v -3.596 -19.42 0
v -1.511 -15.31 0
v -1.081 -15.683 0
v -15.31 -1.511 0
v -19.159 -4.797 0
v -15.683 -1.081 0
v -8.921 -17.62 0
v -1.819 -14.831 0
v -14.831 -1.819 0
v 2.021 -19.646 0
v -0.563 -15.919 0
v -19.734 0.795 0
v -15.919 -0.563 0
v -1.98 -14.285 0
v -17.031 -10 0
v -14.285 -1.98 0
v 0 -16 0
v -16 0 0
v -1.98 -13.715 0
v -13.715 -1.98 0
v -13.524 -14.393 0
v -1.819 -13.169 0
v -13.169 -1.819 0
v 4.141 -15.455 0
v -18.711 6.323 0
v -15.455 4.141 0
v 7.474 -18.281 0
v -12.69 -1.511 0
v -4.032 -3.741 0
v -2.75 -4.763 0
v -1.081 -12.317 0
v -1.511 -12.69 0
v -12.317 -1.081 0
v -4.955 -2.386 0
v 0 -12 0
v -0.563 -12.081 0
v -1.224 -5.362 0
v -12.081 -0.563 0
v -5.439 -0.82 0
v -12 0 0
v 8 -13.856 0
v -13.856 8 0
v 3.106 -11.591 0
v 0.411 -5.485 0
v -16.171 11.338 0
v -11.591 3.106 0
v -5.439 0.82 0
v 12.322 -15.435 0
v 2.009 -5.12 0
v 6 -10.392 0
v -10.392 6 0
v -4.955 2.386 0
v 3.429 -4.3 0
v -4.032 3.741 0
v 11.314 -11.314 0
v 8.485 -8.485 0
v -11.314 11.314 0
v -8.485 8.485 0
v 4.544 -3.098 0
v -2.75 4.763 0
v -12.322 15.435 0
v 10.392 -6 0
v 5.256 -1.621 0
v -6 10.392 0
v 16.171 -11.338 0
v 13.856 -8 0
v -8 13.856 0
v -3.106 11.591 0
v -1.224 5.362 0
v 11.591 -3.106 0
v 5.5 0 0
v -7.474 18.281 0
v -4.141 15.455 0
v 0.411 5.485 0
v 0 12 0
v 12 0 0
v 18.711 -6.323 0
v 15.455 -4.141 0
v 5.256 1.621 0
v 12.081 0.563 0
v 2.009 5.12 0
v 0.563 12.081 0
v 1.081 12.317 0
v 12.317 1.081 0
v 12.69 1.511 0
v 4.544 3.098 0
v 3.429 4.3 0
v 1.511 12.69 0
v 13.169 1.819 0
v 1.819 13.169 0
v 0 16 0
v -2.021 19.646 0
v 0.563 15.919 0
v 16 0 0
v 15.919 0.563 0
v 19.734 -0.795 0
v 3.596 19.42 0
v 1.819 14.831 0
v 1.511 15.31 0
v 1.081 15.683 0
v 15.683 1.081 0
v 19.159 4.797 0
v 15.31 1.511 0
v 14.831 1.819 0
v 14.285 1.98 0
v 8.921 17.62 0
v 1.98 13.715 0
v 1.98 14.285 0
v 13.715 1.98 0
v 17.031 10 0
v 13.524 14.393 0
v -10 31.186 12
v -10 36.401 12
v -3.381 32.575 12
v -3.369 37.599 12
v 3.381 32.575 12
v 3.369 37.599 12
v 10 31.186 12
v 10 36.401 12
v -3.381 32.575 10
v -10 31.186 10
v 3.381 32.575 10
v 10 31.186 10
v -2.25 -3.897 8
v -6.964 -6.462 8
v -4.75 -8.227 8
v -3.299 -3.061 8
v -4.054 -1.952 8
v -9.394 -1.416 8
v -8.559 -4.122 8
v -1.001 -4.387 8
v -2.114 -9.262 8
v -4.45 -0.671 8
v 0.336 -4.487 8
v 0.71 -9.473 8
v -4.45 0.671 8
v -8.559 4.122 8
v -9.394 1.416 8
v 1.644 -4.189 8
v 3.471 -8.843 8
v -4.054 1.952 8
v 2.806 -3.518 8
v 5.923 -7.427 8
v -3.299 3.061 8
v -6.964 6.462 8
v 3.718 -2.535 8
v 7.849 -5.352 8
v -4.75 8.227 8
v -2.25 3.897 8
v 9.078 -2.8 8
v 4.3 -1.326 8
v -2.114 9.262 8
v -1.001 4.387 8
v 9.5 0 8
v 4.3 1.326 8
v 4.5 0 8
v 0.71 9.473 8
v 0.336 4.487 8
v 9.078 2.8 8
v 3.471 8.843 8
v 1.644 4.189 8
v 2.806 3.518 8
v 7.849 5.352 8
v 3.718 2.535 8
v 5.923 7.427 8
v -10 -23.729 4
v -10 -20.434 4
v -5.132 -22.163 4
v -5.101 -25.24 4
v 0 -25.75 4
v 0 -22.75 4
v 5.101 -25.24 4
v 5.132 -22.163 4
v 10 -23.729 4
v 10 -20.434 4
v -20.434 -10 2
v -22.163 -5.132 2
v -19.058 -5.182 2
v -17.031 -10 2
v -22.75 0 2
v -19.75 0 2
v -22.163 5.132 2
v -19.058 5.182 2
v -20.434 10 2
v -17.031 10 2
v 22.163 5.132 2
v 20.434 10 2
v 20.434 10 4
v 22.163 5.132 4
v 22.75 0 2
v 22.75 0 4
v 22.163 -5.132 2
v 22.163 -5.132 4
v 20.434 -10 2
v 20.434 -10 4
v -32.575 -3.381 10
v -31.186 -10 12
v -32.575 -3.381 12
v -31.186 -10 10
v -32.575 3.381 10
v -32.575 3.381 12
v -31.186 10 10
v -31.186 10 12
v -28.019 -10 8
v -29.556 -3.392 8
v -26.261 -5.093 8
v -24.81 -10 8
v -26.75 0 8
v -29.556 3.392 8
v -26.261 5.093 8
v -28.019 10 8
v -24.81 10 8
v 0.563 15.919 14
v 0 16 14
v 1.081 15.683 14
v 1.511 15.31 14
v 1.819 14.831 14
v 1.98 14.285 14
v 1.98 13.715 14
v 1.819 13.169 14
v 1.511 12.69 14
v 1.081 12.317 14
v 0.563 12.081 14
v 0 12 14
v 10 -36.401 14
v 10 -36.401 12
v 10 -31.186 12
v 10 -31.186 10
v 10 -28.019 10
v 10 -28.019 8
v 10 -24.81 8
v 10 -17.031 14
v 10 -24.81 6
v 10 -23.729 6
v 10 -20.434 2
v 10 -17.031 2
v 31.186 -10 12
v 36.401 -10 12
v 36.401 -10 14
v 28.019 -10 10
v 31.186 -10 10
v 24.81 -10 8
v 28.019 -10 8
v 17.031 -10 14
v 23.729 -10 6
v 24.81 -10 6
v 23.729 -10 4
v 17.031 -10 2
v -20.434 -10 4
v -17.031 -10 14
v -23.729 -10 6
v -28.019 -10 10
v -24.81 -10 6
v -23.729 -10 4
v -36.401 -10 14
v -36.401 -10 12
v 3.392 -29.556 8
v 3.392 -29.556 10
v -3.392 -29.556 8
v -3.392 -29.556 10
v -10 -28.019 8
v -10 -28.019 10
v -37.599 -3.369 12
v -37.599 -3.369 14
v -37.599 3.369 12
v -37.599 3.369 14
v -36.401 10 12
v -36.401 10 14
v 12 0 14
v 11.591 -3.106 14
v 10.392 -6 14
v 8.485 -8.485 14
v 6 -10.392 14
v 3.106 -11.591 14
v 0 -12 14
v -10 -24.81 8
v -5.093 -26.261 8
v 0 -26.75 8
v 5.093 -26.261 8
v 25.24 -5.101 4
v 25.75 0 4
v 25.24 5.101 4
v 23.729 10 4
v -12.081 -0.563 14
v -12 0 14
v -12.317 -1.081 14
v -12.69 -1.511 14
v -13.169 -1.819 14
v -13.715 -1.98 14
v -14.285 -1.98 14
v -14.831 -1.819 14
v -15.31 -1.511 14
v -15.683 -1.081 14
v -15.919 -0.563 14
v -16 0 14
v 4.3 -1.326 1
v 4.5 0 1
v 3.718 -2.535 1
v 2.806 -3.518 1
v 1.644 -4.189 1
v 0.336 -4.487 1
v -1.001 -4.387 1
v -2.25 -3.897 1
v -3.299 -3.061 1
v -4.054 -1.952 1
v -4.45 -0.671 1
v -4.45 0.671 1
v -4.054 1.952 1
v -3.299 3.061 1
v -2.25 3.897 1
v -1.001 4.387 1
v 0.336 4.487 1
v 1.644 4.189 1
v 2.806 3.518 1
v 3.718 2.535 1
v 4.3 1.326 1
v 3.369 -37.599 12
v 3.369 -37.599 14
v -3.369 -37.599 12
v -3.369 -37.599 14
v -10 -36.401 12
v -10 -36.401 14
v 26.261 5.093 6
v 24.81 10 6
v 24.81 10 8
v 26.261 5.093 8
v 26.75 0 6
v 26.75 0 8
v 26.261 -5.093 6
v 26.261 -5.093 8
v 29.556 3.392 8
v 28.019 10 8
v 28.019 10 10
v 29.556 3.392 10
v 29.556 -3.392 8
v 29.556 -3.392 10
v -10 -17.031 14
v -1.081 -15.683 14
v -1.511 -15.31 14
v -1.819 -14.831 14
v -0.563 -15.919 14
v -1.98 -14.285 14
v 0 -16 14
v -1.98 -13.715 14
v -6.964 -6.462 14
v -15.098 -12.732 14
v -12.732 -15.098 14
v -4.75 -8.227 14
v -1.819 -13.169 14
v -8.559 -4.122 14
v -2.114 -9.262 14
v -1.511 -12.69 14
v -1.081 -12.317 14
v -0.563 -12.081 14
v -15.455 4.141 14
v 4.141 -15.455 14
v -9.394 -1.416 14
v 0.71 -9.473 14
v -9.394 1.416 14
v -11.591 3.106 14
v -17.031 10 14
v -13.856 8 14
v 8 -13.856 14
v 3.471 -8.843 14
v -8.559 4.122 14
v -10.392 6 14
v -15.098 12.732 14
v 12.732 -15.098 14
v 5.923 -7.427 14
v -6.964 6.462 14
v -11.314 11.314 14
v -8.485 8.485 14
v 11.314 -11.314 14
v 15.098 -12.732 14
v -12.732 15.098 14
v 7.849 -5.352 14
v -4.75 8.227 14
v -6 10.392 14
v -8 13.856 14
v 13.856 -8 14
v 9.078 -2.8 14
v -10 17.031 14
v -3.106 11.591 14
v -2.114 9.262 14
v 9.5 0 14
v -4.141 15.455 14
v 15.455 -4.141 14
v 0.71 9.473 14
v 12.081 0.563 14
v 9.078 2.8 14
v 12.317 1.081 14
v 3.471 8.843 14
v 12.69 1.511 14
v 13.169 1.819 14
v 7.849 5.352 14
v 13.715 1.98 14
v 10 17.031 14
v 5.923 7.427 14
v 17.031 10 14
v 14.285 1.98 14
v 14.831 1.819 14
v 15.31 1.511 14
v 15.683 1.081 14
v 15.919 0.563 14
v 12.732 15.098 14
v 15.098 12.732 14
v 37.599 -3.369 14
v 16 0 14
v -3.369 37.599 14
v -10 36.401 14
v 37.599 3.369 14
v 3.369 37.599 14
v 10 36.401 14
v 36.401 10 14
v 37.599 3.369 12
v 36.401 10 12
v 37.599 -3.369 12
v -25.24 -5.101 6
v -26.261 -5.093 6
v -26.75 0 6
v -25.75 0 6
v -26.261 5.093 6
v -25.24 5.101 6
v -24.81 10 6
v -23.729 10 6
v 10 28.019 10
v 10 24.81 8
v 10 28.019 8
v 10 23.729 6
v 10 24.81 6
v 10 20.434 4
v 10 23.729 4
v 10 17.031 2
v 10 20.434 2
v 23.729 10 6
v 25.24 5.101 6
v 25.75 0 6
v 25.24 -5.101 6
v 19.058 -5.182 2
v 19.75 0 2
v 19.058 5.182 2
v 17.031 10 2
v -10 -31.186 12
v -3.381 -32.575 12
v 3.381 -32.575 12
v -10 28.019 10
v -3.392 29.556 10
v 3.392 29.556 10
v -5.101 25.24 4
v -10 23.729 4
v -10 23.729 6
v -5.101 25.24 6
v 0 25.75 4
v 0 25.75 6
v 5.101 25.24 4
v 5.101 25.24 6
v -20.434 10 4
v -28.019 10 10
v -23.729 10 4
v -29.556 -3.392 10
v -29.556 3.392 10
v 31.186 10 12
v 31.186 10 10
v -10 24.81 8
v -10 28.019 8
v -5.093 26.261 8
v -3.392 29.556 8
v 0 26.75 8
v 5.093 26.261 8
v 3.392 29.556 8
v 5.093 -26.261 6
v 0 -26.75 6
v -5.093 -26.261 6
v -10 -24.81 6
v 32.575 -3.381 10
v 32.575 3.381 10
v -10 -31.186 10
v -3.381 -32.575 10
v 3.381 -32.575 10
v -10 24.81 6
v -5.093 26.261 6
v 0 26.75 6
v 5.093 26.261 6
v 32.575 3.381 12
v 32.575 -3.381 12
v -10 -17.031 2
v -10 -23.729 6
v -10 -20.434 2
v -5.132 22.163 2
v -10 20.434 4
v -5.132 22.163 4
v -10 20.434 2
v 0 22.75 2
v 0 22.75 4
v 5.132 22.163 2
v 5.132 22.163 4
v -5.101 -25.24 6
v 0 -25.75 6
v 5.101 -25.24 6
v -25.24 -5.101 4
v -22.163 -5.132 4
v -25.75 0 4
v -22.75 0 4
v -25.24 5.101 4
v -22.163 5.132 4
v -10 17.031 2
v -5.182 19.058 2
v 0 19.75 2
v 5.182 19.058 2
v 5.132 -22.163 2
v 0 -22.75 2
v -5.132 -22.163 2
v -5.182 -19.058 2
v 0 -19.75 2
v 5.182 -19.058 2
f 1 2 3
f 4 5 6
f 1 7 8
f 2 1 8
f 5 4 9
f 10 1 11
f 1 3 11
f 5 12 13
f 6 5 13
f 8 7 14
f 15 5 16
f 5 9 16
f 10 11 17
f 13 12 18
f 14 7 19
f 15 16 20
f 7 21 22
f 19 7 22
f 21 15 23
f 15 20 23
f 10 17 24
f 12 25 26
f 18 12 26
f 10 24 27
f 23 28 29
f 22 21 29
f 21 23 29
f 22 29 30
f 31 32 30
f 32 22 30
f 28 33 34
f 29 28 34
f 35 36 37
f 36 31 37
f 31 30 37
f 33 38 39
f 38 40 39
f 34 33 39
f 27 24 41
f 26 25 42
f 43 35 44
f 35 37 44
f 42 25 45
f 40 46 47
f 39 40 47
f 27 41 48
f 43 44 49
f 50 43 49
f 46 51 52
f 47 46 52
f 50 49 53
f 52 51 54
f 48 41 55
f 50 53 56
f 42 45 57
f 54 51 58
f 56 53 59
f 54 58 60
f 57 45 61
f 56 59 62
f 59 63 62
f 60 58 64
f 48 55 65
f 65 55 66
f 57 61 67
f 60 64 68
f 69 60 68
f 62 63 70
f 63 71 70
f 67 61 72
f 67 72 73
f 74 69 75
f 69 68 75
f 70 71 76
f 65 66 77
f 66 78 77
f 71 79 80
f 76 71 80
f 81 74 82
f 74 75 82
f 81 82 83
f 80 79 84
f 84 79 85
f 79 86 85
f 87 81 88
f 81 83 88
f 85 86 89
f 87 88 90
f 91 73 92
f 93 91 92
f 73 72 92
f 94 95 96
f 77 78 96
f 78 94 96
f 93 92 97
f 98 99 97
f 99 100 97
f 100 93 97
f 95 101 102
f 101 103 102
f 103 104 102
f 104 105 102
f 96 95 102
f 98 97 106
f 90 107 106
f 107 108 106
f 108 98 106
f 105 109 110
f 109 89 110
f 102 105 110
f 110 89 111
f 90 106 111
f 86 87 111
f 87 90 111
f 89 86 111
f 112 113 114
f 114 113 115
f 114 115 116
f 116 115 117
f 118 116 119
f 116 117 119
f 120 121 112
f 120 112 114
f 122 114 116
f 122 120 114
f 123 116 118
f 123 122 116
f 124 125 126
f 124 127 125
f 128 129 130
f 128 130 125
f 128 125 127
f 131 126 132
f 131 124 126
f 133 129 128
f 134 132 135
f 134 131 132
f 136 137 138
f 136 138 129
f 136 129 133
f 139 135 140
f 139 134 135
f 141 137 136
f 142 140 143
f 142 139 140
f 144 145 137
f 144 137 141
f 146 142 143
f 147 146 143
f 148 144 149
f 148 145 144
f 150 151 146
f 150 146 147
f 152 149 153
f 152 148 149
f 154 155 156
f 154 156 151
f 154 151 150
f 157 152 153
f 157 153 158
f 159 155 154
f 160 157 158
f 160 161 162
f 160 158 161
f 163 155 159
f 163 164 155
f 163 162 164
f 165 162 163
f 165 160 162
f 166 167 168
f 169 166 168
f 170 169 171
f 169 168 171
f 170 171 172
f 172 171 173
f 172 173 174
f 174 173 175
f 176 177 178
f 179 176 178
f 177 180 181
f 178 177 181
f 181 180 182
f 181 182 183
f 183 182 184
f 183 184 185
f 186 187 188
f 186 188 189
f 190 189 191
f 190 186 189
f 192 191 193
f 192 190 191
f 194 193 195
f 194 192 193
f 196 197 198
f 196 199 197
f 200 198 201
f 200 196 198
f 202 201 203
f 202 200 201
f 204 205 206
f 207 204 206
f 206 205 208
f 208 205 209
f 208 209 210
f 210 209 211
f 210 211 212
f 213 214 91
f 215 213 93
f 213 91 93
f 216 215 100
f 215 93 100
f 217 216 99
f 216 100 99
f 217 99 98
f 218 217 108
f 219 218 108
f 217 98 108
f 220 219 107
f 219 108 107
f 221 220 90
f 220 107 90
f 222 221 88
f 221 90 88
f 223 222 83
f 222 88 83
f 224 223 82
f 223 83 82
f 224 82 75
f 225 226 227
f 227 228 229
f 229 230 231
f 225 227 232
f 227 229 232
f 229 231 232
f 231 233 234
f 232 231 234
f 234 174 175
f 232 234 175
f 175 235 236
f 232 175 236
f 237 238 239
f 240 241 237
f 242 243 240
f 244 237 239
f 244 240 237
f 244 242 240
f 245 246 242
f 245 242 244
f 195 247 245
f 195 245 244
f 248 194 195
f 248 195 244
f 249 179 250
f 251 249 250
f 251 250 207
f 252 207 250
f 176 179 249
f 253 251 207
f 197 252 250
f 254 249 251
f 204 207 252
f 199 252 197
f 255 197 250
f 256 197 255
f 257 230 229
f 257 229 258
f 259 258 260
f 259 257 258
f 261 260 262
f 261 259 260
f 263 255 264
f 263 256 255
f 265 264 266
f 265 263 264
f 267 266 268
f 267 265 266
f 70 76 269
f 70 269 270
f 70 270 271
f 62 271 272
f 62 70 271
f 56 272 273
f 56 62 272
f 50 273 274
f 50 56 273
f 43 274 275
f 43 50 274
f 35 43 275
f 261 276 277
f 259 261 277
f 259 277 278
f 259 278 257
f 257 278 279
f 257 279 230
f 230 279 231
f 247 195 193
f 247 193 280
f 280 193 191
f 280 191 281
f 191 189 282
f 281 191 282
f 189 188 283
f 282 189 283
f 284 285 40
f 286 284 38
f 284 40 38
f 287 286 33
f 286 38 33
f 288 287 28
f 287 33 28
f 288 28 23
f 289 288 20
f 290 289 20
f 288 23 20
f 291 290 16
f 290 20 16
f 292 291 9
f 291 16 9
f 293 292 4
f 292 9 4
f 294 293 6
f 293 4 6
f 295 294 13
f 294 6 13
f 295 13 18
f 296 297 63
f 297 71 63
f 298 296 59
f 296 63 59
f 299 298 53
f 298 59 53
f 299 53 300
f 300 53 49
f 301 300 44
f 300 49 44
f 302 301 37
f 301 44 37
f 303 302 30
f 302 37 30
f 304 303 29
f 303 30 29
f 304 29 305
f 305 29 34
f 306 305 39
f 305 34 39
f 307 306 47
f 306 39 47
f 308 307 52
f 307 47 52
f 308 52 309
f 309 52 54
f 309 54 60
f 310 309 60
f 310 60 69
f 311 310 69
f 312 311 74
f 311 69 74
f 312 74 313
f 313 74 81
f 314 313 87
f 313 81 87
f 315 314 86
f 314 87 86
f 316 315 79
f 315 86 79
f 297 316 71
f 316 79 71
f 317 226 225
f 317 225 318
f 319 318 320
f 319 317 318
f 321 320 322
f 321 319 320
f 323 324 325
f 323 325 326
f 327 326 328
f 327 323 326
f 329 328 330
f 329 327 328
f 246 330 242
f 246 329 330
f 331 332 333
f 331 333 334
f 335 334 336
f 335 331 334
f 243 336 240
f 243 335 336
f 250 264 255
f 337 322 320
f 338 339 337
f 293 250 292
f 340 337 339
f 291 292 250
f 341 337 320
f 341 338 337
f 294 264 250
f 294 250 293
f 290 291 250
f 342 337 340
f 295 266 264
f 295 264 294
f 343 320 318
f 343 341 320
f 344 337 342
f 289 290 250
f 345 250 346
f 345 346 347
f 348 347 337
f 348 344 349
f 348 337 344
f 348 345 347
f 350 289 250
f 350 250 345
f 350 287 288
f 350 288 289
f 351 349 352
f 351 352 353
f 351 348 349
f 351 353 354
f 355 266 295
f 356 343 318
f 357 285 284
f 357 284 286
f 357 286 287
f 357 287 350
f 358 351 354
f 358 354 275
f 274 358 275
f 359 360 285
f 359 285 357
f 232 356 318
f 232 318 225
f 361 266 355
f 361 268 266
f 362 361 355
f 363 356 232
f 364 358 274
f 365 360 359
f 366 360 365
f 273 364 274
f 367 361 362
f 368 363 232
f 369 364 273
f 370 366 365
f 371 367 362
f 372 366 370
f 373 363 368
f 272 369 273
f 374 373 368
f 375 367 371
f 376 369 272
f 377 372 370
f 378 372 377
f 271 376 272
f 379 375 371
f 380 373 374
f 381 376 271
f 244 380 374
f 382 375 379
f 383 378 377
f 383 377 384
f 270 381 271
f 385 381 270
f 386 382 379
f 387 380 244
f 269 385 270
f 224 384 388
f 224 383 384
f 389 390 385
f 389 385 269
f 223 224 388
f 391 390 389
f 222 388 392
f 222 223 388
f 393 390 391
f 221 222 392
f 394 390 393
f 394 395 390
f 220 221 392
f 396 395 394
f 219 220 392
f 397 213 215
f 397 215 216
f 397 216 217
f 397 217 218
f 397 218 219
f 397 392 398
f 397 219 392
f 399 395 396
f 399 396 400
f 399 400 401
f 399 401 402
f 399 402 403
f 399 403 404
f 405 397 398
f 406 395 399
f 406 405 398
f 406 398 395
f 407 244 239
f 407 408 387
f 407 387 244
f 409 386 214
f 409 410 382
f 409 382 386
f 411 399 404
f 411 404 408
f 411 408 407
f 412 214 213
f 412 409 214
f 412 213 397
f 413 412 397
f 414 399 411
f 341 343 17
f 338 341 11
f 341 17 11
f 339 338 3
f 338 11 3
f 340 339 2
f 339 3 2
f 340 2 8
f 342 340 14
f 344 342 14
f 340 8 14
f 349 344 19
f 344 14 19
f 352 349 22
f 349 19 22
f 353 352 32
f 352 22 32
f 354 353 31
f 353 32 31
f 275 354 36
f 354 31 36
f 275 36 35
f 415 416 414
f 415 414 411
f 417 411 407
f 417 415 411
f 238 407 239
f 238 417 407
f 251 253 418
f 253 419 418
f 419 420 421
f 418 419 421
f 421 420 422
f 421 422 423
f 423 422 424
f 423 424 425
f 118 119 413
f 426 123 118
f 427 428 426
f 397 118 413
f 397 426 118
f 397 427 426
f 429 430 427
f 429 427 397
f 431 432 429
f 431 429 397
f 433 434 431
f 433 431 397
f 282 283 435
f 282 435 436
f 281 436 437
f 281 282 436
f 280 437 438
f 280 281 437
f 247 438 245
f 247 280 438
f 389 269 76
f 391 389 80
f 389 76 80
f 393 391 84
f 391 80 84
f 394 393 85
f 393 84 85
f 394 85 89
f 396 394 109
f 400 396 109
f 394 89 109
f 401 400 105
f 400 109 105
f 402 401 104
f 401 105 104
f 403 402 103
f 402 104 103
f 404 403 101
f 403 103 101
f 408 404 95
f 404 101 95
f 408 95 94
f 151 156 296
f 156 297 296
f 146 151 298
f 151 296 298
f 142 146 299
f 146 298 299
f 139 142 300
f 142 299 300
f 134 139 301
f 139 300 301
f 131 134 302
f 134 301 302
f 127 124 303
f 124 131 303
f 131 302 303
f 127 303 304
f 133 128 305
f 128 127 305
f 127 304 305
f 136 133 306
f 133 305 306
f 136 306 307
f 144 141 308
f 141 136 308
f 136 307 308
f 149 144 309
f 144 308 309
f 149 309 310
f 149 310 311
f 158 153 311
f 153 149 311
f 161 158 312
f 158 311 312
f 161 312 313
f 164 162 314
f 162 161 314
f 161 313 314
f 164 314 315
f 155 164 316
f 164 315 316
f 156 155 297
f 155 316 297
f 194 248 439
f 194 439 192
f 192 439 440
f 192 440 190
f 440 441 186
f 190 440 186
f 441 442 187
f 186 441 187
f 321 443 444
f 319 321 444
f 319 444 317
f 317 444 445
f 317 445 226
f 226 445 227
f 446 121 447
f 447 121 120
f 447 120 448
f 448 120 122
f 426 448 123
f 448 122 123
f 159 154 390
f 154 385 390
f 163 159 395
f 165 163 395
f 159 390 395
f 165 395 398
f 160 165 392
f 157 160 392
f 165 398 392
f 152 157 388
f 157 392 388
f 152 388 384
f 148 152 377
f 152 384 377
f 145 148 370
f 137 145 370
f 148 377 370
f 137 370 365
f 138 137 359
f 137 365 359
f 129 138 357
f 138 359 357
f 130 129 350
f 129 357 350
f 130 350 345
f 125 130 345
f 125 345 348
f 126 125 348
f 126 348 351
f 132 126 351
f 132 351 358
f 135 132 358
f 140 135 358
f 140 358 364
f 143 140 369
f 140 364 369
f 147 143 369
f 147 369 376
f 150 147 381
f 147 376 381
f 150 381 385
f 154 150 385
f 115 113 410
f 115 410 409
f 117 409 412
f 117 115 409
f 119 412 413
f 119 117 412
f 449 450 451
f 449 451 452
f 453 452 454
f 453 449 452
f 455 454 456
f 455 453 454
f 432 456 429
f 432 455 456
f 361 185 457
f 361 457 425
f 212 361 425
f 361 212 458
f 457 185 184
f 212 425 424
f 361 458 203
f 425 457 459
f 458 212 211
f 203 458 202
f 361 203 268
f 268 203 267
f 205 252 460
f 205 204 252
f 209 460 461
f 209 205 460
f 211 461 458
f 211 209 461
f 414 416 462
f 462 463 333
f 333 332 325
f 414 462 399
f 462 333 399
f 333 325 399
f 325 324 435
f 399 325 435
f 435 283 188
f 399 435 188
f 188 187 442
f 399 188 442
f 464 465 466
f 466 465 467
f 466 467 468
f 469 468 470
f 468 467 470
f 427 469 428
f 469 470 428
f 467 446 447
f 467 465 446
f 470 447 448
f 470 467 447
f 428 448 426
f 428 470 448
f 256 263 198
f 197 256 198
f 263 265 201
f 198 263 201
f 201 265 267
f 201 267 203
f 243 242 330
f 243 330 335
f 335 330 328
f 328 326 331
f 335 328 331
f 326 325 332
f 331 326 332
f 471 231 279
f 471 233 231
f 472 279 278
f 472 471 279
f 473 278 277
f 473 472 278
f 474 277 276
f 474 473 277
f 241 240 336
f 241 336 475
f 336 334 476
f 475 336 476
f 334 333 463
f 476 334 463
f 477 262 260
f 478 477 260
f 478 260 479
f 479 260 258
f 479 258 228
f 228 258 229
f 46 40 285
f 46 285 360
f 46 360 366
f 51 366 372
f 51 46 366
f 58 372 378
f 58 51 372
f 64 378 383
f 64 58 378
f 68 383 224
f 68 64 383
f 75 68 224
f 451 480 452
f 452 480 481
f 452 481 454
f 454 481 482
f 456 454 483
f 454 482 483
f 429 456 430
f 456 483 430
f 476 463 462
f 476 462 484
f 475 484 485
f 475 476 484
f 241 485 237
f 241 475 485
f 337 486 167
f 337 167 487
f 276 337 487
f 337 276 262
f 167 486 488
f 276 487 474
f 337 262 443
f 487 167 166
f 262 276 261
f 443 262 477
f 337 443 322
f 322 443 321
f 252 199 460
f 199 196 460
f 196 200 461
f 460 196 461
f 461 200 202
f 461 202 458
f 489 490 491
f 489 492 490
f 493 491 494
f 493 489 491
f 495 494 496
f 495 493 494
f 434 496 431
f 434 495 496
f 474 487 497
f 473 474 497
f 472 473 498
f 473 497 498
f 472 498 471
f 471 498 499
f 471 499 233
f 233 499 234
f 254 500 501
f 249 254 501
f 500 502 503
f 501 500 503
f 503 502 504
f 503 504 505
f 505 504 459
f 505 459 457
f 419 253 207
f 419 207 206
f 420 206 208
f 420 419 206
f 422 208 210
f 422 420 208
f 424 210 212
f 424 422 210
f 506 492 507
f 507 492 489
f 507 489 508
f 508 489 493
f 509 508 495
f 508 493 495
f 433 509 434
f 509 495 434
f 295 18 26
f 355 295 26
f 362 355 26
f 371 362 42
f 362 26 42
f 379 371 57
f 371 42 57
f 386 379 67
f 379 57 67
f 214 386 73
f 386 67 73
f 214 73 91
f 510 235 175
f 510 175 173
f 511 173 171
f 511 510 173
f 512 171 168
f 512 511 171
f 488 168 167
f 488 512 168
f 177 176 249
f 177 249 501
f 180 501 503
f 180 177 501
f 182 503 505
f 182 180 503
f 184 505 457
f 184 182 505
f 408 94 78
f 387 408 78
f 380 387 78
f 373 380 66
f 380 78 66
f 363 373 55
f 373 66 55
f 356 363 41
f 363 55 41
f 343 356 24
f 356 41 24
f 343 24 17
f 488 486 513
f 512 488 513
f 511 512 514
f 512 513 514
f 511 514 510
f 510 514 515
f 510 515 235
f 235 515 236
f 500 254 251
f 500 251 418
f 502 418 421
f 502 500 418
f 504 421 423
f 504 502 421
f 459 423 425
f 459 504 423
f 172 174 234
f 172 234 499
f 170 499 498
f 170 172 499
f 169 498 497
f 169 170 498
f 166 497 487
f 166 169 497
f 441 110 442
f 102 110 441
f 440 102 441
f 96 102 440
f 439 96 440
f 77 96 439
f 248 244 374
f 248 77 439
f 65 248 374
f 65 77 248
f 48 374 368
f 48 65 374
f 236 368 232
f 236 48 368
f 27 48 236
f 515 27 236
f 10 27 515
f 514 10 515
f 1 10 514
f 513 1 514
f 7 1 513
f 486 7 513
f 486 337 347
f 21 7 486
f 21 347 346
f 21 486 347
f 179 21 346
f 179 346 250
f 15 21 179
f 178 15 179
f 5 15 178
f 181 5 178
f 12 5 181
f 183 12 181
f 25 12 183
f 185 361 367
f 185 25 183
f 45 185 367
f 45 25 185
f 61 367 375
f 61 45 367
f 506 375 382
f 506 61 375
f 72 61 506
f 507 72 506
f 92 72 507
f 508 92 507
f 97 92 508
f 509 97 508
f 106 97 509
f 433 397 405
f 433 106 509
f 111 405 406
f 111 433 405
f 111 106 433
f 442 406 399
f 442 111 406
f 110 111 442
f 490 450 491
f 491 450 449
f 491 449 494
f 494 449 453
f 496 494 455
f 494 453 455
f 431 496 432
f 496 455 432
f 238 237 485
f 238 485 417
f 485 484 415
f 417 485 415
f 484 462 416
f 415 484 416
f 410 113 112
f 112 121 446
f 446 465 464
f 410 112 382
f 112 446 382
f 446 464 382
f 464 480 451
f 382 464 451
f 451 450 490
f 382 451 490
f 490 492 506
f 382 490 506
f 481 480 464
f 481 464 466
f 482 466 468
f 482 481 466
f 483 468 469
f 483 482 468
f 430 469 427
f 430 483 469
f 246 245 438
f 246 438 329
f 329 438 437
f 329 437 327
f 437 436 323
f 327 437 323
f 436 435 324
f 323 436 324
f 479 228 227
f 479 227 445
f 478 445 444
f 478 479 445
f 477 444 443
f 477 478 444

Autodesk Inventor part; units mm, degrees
ref_plane "YZ Plane" through (0, 0, 0) normal (1, 0, 0) x (0, 1, 0)
ref_plane "XZ Plane" through (0, 0, 0) normal (0, 1, 0) x (-1, 0, 0)
ref_plane "XY Plane" through (0, 0, 0) normal (0, 0, 1) x (1, 0, 0)
sketch "Szkic1" plane through (0, 0, 0) normal (0, 0, 1) x (1, 0, 0)
  line L0 (-20.4343, -10) -> (-41.564, -10)
  line L1 (-20.4343, 10) -> (-41.564, 10)
  line L2 (-10, -20.4343) -> (-10, -41.564)
  line L3 (10, -20.4343) -> (10, -41.564)
  line L4 (20.4343, -10) -> (41.564, -10)
  line L5 (20.4343, 10) -> (41.564, 10)
  line L6 (10, 20.4343) -> (10, 41.564)
  line L7 (-10, 20.4343) -> (-10, 41.564)
  arc A0 (-36.4014, 10) -> (-36.4014, -10) centre (0, 0) ccw
  arc A1 (-31.1859, 10) -> (-31.1859, -10) centre (0, 0) ccw
  arc A2 (-28.019, 10) -> (-28.019, -10) centre (0, 0) ccw
  arc A3 (-24.8105, 10) -> (-24.8105, -10) centre (0, 0) ccw
  arc A4 (-23.7289, 10) -> (-23.7289, -10) centre (0, 0) ccw
  arc A5 (-20.4343, 10) -> (-20.4343, -10) centre (0, 0) ccw
  arc A6 (-41.564, 10) -> (-41.564, -10) centre (0, 0) ccw
  arc A7 (-10, -20.4343) -> (10, -20.4343) centre (0, 0) ccw
  arc A8 (-10, -23.7289) -> (10, -23.7289) centre (0, 0) ccw
  arc A9 (-10, -24.8105) -> (10, -24.8105) centre (0, 0) ccw
  arc A10 (-10, -28.019) -> (10, -28.019) centre (0, 0) ccw
  arc A11 (-10, -31.1859) -> (10, -31.1859) centre (0, 0) ccw
  arc A12 (-10, -36.4014) -> (10, -36.4014) centre (0, 0) ccw
  arc A13 (-10, -41.564) -> (10, -41.564) centre (0, 0) ccw
  arc A14 (20.4343, -10) -> (20.4343, 10) centre (0, 0) ccw
  arc A15 (10, 20.4343) -> (-10, 20.4343) centre (0, 0) ccw
  arc A16 (23.7289, -10) -> (23.7289, 10) centre (0, 0) ccw
  arc A17 (10, 23.7289) -> (-10, 23.7289) centre (0, 0) ccw
  arc A18 (24.8105, -10) -> (24.8105, 10) centre (0, 0) ccw
  arc A19 (10, 24.8105) -> (-10, 24.8105) centre (0, 0) ccw
  arc A20 (28.019, -10) -> (28.019, 10) centre (0, 0) ccw
  arc A21 (10, 28.019) -> (-10, 28.019) centre (0, 0) ccw
  arc A22 (31.1859, -10) -> (31.1859, 10) centre (0, 0) ccw
  arc A23 (10, 31.1859) -> (-10, 31.1859) centre (0, 0) ccw
  arc A24 (36.4014, -10) -> (36.4014, 10) centre (0, 0) ccw
  arc A25 (10, 36.4014) -> (-10, 36.4014) centre (0, 0) ccw
  arc A26 (41.564, -10) -> (41.564, 10) centre (0, 0) ccw
  arc A27 (10, 41.564) -> (-10, 41.564) centre (0, 0) ccw
  circle A28 centre (0, 0) radius 4.5
  circle A29 centre (0, 0) radius 19.75
  line L8 (10, 20.4343) -> (10, 17.0312)
  line L9 (-10, 20.4343) -> (-10, 17.0312)
  line L10 (10, -20.4343) -> (10, -17.0312)
  line L11 (-20.4343, -10) -> (-17.0312, -10)
  line L12 (-20.4343, 10) -> (-17.0312, 10)
  line L13 (-10, -17.0312) -> (-10, -20.4343)
  line L14 (20.4343, 10) -> (17.0312, 10)
  line L15 (20.4343, -10) -> (17.0312, -10)
  line L16 (0, -4.5265) -> (0, 3.8342)
  line L17 (3.7027, 0) -> (-4.6541, 0)
  arc A30 (0, -14) -> (14, 0) centre (0, 0) ccw construction
  arc A31 (0, -16.5) -> (16.5, 0) centre (0, 0) ccw
  arc A32 (0, -11.5) -> (11.5, 0) centre (0, 0) ccw
  arc A33 (0, -11.5) -> (0, -16.5) centre (0, -14) ccw
  arc A34 (16.5, 0) -> (11.5, 0) centre (14, 0) ccw
  arc A35 (0, 14) -> (-14, 0) centre (0, 0) ccw construction
  arc A36 (0, 16.5) -> (-16.5, 0) centre (0, 0) ccw
  arc A37 (0, 11.5) -> (-11.5, 0) centre (0, 0) ccw
  arc A38 (0, 11.5) -> (0, 16.5) centre (0, 14) ccw
  arc A39 (-16.5, 0) -> (-11.5, 0) centre (-14, 0) ccw
  arc A40 (0, -12) -> (12, 0) centre (0, 0) ccw
  arc A41 (0, -12) -> (0, -16) centre (0, -14) ccw
  arc A42 (0, -16) -> (16, 0) centre (0, 0) ccw
  arc A43 (16, 0) -> (12, 0) centre (14, 0) ccw
  arc A44 (0, 12) -> (-12, 0) centre (0, 0) ccw
  arc A45 (0, 12) -> (0, 16) centre (0, 14) ccw
  arc A46 (0, 16) -> (-16, 0) centre (0, 0) ccw
  arc A47 (-16, 0) -> (-12, 0) centre (-14, 0) ccw
  point P0 (10, -17.0312)
  point P1 (-10, -17.0312)
  point P2 (-10, 17.0312)
  dimension "d62" = 22.75
  dimension "d14" = 9
  dimension "d42" = 14
  dimension "d43" = 14
  dimension "d44" = 14
  dimension "d45" = 14
  dimension "d47" = 5
  dimension "d48" = 5
  dimension "d57" = 0.5
  dimension "d58" = 0.5
extrude "Wyciągnięcie proste2" add sketch "Szkic1" along normal blind 14 contours L0 A4 L1 A5 | A5 L12 A29 L11 | L0 A3 L1 A4 | A29 | L0 A2 L1 A3 | A29 L10 A7 L13 | L0 A1 L1 A2 | L9 A15 L8 A29 | A7 L3 A8 L2 | L0 A0 L1 A1 | L7 A17 L6 A15 | A29 L14 A14 L15 | A8 L3 A9 L2 | L0 A6 L1 A0 | L7 A19 L6 A17 | A14 L5 A16 L4 | A9 L3 A10 L2 | L7 A21 L6 A19 | A16 L5 A18 L4 | A10 L3 A11 L2 | L7 A23 L6 A21 | A18 L5 A20 L4 | A11 L3 A12 L2 | L7 A25 L6 A23 | A20 L5 A22 L4 | A12 L3 A13 L2 | L7 A27 L6 A25 | A22 L5 A24 L4 | A24 L5 A26 L4 | A33 A32 A34 A31 | A38 A37 A39 A36 | A40 A43 A42 A41 | A44 A47 A46 A45
extrude "Wyciągnięcie proste3" cut sketch "Szkic1" along normal blind 2 contours A5 L12 A29 L11 | A29 L10 A7 L13 | L9 A15 L8 A29 | A29 L14 A14 L15
extrude "Wyciągnięcie proste4" cut sketch "Szkic1" along normal blind 4 contours L0 A4 L1 A5 | A7 L3 A8 L2 | L7 A17 L6 A15 | A14 L5 A16 L4
extrude "Wyciągnięcie proste5" cut sketch "Szkic1" along normal blind 6 contours L0 A3 L1 A4 | A8 L3 A9 L2 | L7 A19 L6 A17 | A16 L5 A18 L4
extrude "Wyciągnięcie proste6" cut sketch "Szkic1" along normal blind 8 contours L0 A2 L1 A3 | A9 L3 A10 L2 | L7 A21 L6 A19 | A18 L5 A20 L4
extrude "Wyciągnięcie proste7" cut sketch "Szkic1" along normal blind 10 contours L0 A1 L1 A2 | A10 L3 A11 L2 | L7 A23 L6 A21 | A20 L5 A22 L4
extrude "Wyciągnięcie proste8" cut sketch "Szkic1" along normal blind 12 contours L0 A0 L1 A1 | A11 L3 A12 L2 | L7 A25 L6 A23 | A22 L5 A24 L4
extrude "Wyciągnięcie proste9" cut sketch "Szkic1" along normal blind 15 contours L0 A6 L1 A0 | A12 L3 A13 L2 | L7 A27 L6 A25 | A24 L5 A26 L4
sketch "Szkic2" plane through (0, 0, 14) normal (0, 0, 1) x (1, 0, 0)
  circle A0 centre (0, 0) radius 4.5 projected
  line L0 (10, -36.4014) -> (10, -17.0312) projected
  arc A1 (10, -17.0312) -> (17.0312, -10) centre (0, 0) ccw projected
  line L1 (17.0312, -10) -> (36.4014, -10) projected
  line L2 (36.4014, 10) -> (17.0312, 10) projected
  arc A2 (17.0312, 10) -> (10, 17.0312) centre (0, 0) ccw projected
  line L3 (10, 17.0312) -> (10, 36.4014) projected
  line L4 (-10, 36.4014) -> (-10, 17.0312) projected
  arc A3 (-10, 17.0312) -> (-17.0312, 10) centre (0, 0) ccw projected
  line L5 (-17.0312, 10) -> (-36.4014, 10) projected
  line L6 (-36.4014, -10) -> (-17.0312, -10) projected
  arc A4 (-17.0312, -10) -> (-10, -17.0312) centre (0, 0) ccw projected
  line L7 (-10, -17.0312) -> (-10, -36.4014) projected
  circle A5 centre (0, 0) radius 9.5
  arc A6 (36.4014, -10) -> (36.4014, 10) centre (0, 0) ccw projected
  arc A7 (10, 36.4014) -> (-10, 36.4014) centre (0, 0) ccw projected
  arc A8 (-36.4014, 10) -> (-36.4014, -10) centre (0, 0) ccw projected
  arc A9 (-10, -36.4014) -> (10, -36.4014) centre (0, 0) ccw projected
  dimension "d33" = 19
extrude "Wyciągnięcie proste10" cut sketch "Szkic2" against normal blind 6 contours A5
chamfer "Faza2" distance 1 angle 45 1 edges at (-4.5, 0, 0)
extrude "Wyciągnięcie proste12" cut sketch "Szkic1" along normal blind 17 contours A40 A43 A42 A41 | A44 A47 A46 A45
properties part number "3DP_ABS_Filament_Spool_Mount_Bearing_Block"
